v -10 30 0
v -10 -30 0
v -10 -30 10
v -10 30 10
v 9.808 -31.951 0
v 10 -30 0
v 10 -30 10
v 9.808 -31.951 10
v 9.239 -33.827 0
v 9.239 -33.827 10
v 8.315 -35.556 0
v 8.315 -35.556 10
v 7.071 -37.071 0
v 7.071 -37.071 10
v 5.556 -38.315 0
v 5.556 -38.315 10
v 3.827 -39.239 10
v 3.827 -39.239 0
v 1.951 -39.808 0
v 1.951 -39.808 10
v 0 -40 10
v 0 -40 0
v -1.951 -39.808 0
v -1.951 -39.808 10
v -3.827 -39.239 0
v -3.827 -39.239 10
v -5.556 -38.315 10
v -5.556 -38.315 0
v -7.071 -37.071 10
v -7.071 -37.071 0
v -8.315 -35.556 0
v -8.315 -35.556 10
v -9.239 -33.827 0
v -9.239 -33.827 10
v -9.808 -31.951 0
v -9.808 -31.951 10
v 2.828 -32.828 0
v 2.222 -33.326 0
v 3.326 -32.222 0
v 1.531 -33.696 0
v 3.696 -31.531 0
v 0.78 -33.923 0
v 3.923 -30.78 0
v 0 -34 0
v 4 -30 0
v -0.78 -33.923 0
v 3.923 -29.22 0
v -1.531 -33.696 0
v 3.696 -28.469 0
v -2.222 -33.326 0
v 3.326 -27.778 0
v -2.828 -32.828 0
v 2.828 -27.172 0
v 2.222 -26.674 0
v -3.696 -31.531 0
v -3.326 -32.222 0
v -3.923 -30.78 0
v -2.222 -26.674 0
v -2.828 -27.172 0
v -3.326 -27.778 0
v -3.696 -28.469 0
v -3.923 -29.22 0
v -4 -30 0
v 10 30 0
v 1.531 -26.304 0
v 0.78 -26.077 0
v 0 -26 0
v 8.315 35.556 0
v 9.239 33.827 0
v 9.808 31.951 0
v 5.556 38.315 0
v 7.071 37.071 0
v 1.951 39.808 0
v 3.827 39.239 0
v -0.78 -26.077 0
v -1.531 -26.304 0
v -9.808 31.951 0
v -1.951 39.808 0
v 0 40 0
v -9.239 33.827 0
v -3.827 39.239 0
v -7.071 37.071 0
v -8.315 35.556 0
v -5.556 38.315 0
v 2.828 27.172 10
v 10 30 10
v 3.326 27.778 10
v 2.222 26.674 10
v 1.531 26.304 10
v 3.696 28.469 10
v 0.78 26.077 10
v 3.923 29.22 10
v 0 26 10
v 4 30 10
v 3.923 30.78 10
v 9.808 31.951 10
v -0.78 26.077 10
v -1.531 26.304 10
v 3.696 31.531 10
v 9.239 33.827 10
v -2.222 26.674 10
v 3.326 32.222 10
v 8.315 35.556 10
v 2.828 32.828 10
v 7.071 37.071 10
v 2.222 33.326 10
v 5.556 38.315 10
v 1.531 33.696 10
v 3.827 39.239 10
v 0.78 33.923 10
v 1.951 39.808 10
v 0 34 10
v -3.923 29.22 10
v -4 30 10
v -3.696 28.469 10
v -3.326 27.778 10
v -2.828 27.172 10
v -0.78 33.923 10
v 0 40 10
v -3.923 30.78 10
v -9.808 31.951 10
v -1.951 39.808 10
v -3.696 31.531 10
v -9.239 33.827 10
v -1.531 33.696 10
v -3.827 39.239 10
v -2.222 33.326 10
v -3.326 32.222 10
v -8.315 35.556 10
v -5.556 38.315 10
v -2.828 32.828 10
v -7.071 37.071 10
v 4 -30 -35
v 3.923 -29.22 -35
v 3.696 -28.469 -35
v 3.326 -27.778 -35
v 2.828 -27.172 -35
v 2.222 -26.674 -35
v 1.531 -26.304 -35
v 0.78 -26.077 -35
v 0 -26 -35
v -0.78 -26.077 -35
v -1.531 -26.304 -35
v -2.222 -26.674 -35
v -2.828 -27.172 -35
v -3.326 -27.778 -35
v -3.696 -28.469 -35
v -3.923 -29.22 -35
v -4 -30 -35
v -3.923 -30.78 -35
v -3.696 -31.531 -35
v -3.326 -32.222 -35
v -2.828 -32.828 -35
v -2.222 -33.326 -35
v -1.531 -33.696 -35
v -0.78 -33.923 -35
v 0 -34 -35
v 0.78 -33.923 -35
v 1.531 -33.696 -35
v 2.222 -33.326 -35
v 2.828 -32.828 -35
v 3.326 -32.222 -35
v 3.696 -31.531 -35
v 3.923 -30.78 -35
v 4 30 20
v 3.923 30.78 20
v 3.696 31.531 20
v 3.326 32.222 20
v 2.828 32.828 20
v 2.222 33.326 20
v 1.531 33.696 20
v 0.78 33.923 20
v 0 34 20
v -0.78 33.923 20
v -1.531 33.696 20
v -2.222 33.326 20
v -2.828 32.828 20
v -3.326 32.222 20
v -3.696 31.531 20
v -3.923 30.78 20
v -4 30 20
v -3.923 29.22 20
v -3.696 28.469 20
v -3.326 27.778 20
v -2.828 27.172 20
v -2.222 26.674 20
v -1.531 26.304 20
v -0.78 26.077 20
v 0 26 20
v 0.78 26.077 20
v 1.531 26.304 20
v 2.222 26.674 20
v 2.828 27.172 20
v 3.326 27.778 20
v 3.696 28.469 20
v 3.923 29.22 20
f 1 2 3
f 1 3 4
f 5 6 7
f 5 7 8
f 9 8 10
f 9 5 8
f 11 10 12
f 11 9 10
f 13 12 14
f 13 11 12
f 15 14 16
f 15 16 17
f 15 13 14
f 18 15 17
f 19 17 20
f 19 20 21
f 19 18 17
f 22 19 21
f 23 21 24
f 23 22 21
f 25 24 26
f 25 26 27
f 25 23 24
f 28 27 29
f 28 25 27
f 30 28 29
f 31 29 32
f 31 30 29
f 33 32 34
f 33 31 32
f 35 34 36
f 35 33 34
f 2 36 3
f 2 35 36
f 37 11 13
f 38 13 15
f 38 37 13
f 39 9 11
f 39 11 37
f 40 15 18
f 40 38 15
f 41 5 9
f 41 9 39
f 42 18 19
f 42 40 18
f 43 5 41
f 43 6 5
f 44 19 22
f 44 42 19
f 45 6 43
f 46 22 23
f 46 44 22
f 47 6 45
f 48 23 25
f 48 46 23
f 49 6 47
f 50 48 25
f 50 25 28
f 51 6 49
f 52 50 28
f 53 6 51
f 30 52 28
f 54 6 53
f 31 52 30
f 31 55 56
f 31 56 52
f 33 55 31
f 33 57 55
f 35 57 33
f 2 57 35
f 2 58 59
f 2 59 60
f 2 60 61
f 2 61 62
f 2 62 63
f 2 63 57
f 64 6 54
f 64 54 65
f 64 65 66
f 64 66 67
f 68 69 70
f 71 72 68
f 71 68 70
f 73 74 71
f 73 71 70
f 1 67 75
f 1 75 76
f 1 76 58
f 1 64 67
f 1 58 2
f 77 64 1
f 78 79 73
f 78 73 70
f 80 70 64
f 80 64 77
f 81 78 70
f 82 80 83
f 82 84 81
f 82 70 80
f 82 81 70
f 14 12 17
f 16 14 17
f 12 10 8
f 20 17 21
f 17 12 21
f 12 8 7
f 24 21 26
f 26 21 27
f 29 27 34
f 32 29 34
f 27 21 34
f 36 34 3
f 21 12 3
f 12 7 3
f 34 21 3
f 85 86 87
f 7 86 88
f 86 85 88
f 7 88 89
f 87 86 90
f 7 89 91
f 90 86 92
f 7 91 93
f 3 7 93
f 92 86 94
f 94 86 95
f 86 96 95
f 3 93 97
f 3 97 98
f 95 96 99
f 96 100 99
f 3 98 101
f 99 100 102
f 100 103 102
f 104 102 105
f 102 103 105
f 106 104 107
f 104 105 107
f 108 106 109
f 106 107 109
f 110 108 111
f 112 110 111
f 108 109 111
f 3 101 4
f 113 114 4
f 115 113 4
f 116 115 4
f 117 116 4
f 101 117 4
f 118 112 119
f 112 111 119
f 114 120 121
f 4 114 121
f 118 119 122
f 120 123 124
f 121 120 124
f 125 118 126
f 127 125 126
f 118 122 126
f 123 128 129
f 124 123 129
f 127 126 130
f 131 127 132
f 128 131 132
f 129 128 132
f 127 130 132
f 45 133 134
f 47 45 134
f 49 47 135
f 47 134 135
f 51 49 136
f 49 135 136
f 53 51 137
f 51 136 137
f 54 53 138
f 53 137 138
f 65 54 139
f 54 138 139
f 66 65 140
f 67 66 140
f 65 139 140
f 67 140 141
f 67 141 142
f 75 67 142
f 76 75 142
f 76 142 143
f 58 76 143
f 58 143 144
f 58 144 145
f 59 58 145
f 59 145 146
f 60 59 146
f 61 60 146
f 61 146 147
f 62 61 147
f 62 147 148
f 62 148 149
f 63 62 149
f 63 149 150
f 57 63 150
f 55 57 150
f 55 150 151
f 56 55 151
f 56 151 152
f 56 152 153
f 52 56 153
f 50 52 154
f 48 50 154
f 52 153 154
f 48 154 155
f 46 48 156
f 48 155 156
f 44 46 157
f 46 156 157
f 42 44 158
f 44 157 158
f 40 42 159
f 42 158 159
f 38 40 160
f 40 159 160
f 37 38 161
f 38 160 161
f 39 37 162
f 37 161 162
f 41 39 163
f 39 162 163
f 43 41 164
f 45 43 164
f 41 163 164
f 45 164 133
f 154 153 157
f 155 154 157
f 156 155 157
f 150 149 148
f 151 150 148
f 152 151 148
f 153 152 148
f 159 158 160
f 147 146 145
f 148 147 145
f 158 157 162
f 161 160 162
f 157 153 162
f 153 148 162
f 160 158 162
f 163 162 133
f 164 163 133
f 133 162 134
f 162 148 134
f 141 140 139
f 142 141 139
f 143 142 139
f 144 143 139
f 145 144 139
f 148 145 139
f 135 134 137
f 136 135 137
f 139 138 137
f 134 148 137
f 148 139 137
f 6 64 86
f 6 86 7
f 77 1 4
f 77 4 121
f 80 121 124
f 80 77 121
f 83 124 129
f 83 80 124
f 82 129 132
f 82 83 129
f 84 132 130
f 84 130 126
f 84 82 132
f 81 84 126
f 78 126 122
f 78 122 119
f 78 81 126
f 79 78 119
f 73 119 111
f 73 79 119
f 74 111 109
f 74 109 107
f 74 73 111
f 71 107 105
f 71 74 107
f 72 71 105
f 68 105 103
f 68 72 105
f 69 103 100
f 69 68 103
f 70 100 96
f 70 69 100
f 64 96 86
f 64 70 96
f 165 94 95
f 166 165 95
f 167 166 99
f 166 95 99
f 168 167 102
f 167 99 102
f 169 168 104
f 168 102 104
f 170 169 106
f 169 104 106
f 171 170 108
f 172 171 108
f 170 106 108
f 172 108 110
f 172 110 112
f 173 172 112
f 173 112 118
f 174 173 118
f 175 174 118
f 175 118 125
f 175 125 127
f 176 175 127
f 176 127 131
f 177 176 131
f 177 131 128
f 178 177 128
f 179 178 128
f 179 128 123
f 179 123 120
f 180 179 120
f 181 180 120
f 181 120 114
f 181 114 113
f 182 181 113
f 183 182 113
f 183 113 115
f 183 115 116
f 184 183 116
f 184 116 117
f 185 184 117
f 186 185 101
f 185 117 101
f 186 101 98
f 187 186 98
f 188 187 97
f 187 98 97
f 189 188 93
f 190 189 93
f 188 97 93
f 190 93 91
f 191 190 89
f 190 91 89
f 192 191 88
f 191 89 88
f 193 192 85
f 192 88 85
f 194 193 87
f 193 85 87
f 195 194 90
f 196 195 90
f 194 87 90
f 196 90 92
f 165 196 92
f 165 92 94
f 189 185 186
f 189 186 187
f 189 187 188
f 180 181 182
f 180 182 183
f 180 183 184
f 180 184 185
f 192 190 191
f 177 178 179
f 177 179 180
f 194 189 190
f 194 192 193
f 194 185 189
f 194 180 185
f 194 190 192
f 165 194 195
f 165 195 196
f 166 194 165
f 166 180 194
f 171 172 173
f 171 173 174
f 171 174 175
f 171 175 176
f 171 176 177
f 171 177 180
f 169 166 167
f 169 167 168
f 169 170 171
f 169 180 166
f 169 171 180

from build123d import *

# Parameters (mm, degrees)
SKETCH1_R           = 4
BOSS_EXTRUDE1_DEPTH = 10
SKETCH1_2_R         = 4
BOSS_EXTRUDE2_DEPTH = 20
BOSS_EXTRUDE3_START = -35
SKETCH1_3_R         = 4
BOSS_EXTRUDE3_DEPTH = 45


with BuildPart() as part:
    # Sketch1 → Boss-Extrude1 (new body)
    with BuildSketch(Plane.XY):
        with BuildLine():
            Line((10, 30), (10, -30))
            ThreePointArc((10, -30), (0, -40), (-10, -30))
            Line((-10, -30), (-10, 30))
            ThreePointArc((-10, 30), (0, 40), (10, 30))
        make_face()
        with Locations((0, 30)):
            Circle(SKETCH1_R, mode=Mode.SUBTRACT)
        with Locations((0, -30)):
            Circle(SKETCH1_R, mode=Mode.SUBTRACT)
    extrude(amount=BOSS_EXTRUDE1_DEPTH)

    # Sketch1<2> → Boss-Extrude2 (add)
    with BuildSketch(Plane.XY):
        with Locations((0, 30)):
            Circle(SKETCH1_2_R)
    extrude(amount=BOSS_EXTRUDE2_DEPTH)

    # Sketch1<3> → Boss-Extrude3 (add)
    with BuildSketch(Plane.XY.offset(BOSS_EXTRUDE3_START)):
        with Locations((0, -30)):
            Circle(SKETCH1_3_R)
    extrude(amount=BOSS_EXTRUDE3_DEPTH)


solid = part.part
